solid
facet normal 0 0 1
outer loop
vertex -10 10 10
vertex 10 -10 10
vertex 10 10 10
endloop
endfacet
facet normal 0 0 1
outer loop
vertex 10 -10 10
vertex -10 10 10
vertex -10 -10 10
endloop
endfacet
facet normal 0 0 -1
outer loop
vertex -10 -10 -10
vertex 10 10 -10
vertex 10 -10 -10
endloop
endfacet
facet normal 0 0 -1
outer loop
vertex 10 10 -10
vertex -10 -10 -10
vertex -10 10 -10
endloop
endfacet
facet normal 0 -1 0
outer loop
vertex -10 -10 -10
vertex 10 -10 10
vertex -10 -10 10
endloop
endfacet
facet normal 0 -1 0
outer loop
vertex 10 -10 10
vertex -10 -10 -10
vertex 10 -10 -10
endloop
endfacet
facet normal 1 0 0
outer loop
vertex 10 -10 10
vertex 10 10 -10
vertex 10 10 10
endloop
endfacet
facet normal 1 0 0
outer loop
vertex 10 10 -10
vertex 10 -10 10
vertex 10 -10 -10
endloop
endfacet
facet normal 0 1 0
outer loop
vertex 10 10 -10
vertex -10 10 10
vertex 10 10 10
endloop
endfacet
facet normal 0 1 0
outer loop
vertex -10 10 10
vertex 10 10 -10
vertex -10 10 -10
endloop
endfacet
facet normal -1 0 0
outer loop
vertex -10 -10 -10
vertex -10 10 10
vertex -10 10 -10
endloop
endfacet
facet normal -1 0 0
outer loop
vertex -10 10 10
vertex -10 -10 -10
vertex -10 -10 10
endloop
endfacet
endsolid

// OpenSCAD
cube_size = 20;
color_val = [1, 0, 0];

color(color_val)
cube([cube_size, cube_size, cube_size], center = true);
